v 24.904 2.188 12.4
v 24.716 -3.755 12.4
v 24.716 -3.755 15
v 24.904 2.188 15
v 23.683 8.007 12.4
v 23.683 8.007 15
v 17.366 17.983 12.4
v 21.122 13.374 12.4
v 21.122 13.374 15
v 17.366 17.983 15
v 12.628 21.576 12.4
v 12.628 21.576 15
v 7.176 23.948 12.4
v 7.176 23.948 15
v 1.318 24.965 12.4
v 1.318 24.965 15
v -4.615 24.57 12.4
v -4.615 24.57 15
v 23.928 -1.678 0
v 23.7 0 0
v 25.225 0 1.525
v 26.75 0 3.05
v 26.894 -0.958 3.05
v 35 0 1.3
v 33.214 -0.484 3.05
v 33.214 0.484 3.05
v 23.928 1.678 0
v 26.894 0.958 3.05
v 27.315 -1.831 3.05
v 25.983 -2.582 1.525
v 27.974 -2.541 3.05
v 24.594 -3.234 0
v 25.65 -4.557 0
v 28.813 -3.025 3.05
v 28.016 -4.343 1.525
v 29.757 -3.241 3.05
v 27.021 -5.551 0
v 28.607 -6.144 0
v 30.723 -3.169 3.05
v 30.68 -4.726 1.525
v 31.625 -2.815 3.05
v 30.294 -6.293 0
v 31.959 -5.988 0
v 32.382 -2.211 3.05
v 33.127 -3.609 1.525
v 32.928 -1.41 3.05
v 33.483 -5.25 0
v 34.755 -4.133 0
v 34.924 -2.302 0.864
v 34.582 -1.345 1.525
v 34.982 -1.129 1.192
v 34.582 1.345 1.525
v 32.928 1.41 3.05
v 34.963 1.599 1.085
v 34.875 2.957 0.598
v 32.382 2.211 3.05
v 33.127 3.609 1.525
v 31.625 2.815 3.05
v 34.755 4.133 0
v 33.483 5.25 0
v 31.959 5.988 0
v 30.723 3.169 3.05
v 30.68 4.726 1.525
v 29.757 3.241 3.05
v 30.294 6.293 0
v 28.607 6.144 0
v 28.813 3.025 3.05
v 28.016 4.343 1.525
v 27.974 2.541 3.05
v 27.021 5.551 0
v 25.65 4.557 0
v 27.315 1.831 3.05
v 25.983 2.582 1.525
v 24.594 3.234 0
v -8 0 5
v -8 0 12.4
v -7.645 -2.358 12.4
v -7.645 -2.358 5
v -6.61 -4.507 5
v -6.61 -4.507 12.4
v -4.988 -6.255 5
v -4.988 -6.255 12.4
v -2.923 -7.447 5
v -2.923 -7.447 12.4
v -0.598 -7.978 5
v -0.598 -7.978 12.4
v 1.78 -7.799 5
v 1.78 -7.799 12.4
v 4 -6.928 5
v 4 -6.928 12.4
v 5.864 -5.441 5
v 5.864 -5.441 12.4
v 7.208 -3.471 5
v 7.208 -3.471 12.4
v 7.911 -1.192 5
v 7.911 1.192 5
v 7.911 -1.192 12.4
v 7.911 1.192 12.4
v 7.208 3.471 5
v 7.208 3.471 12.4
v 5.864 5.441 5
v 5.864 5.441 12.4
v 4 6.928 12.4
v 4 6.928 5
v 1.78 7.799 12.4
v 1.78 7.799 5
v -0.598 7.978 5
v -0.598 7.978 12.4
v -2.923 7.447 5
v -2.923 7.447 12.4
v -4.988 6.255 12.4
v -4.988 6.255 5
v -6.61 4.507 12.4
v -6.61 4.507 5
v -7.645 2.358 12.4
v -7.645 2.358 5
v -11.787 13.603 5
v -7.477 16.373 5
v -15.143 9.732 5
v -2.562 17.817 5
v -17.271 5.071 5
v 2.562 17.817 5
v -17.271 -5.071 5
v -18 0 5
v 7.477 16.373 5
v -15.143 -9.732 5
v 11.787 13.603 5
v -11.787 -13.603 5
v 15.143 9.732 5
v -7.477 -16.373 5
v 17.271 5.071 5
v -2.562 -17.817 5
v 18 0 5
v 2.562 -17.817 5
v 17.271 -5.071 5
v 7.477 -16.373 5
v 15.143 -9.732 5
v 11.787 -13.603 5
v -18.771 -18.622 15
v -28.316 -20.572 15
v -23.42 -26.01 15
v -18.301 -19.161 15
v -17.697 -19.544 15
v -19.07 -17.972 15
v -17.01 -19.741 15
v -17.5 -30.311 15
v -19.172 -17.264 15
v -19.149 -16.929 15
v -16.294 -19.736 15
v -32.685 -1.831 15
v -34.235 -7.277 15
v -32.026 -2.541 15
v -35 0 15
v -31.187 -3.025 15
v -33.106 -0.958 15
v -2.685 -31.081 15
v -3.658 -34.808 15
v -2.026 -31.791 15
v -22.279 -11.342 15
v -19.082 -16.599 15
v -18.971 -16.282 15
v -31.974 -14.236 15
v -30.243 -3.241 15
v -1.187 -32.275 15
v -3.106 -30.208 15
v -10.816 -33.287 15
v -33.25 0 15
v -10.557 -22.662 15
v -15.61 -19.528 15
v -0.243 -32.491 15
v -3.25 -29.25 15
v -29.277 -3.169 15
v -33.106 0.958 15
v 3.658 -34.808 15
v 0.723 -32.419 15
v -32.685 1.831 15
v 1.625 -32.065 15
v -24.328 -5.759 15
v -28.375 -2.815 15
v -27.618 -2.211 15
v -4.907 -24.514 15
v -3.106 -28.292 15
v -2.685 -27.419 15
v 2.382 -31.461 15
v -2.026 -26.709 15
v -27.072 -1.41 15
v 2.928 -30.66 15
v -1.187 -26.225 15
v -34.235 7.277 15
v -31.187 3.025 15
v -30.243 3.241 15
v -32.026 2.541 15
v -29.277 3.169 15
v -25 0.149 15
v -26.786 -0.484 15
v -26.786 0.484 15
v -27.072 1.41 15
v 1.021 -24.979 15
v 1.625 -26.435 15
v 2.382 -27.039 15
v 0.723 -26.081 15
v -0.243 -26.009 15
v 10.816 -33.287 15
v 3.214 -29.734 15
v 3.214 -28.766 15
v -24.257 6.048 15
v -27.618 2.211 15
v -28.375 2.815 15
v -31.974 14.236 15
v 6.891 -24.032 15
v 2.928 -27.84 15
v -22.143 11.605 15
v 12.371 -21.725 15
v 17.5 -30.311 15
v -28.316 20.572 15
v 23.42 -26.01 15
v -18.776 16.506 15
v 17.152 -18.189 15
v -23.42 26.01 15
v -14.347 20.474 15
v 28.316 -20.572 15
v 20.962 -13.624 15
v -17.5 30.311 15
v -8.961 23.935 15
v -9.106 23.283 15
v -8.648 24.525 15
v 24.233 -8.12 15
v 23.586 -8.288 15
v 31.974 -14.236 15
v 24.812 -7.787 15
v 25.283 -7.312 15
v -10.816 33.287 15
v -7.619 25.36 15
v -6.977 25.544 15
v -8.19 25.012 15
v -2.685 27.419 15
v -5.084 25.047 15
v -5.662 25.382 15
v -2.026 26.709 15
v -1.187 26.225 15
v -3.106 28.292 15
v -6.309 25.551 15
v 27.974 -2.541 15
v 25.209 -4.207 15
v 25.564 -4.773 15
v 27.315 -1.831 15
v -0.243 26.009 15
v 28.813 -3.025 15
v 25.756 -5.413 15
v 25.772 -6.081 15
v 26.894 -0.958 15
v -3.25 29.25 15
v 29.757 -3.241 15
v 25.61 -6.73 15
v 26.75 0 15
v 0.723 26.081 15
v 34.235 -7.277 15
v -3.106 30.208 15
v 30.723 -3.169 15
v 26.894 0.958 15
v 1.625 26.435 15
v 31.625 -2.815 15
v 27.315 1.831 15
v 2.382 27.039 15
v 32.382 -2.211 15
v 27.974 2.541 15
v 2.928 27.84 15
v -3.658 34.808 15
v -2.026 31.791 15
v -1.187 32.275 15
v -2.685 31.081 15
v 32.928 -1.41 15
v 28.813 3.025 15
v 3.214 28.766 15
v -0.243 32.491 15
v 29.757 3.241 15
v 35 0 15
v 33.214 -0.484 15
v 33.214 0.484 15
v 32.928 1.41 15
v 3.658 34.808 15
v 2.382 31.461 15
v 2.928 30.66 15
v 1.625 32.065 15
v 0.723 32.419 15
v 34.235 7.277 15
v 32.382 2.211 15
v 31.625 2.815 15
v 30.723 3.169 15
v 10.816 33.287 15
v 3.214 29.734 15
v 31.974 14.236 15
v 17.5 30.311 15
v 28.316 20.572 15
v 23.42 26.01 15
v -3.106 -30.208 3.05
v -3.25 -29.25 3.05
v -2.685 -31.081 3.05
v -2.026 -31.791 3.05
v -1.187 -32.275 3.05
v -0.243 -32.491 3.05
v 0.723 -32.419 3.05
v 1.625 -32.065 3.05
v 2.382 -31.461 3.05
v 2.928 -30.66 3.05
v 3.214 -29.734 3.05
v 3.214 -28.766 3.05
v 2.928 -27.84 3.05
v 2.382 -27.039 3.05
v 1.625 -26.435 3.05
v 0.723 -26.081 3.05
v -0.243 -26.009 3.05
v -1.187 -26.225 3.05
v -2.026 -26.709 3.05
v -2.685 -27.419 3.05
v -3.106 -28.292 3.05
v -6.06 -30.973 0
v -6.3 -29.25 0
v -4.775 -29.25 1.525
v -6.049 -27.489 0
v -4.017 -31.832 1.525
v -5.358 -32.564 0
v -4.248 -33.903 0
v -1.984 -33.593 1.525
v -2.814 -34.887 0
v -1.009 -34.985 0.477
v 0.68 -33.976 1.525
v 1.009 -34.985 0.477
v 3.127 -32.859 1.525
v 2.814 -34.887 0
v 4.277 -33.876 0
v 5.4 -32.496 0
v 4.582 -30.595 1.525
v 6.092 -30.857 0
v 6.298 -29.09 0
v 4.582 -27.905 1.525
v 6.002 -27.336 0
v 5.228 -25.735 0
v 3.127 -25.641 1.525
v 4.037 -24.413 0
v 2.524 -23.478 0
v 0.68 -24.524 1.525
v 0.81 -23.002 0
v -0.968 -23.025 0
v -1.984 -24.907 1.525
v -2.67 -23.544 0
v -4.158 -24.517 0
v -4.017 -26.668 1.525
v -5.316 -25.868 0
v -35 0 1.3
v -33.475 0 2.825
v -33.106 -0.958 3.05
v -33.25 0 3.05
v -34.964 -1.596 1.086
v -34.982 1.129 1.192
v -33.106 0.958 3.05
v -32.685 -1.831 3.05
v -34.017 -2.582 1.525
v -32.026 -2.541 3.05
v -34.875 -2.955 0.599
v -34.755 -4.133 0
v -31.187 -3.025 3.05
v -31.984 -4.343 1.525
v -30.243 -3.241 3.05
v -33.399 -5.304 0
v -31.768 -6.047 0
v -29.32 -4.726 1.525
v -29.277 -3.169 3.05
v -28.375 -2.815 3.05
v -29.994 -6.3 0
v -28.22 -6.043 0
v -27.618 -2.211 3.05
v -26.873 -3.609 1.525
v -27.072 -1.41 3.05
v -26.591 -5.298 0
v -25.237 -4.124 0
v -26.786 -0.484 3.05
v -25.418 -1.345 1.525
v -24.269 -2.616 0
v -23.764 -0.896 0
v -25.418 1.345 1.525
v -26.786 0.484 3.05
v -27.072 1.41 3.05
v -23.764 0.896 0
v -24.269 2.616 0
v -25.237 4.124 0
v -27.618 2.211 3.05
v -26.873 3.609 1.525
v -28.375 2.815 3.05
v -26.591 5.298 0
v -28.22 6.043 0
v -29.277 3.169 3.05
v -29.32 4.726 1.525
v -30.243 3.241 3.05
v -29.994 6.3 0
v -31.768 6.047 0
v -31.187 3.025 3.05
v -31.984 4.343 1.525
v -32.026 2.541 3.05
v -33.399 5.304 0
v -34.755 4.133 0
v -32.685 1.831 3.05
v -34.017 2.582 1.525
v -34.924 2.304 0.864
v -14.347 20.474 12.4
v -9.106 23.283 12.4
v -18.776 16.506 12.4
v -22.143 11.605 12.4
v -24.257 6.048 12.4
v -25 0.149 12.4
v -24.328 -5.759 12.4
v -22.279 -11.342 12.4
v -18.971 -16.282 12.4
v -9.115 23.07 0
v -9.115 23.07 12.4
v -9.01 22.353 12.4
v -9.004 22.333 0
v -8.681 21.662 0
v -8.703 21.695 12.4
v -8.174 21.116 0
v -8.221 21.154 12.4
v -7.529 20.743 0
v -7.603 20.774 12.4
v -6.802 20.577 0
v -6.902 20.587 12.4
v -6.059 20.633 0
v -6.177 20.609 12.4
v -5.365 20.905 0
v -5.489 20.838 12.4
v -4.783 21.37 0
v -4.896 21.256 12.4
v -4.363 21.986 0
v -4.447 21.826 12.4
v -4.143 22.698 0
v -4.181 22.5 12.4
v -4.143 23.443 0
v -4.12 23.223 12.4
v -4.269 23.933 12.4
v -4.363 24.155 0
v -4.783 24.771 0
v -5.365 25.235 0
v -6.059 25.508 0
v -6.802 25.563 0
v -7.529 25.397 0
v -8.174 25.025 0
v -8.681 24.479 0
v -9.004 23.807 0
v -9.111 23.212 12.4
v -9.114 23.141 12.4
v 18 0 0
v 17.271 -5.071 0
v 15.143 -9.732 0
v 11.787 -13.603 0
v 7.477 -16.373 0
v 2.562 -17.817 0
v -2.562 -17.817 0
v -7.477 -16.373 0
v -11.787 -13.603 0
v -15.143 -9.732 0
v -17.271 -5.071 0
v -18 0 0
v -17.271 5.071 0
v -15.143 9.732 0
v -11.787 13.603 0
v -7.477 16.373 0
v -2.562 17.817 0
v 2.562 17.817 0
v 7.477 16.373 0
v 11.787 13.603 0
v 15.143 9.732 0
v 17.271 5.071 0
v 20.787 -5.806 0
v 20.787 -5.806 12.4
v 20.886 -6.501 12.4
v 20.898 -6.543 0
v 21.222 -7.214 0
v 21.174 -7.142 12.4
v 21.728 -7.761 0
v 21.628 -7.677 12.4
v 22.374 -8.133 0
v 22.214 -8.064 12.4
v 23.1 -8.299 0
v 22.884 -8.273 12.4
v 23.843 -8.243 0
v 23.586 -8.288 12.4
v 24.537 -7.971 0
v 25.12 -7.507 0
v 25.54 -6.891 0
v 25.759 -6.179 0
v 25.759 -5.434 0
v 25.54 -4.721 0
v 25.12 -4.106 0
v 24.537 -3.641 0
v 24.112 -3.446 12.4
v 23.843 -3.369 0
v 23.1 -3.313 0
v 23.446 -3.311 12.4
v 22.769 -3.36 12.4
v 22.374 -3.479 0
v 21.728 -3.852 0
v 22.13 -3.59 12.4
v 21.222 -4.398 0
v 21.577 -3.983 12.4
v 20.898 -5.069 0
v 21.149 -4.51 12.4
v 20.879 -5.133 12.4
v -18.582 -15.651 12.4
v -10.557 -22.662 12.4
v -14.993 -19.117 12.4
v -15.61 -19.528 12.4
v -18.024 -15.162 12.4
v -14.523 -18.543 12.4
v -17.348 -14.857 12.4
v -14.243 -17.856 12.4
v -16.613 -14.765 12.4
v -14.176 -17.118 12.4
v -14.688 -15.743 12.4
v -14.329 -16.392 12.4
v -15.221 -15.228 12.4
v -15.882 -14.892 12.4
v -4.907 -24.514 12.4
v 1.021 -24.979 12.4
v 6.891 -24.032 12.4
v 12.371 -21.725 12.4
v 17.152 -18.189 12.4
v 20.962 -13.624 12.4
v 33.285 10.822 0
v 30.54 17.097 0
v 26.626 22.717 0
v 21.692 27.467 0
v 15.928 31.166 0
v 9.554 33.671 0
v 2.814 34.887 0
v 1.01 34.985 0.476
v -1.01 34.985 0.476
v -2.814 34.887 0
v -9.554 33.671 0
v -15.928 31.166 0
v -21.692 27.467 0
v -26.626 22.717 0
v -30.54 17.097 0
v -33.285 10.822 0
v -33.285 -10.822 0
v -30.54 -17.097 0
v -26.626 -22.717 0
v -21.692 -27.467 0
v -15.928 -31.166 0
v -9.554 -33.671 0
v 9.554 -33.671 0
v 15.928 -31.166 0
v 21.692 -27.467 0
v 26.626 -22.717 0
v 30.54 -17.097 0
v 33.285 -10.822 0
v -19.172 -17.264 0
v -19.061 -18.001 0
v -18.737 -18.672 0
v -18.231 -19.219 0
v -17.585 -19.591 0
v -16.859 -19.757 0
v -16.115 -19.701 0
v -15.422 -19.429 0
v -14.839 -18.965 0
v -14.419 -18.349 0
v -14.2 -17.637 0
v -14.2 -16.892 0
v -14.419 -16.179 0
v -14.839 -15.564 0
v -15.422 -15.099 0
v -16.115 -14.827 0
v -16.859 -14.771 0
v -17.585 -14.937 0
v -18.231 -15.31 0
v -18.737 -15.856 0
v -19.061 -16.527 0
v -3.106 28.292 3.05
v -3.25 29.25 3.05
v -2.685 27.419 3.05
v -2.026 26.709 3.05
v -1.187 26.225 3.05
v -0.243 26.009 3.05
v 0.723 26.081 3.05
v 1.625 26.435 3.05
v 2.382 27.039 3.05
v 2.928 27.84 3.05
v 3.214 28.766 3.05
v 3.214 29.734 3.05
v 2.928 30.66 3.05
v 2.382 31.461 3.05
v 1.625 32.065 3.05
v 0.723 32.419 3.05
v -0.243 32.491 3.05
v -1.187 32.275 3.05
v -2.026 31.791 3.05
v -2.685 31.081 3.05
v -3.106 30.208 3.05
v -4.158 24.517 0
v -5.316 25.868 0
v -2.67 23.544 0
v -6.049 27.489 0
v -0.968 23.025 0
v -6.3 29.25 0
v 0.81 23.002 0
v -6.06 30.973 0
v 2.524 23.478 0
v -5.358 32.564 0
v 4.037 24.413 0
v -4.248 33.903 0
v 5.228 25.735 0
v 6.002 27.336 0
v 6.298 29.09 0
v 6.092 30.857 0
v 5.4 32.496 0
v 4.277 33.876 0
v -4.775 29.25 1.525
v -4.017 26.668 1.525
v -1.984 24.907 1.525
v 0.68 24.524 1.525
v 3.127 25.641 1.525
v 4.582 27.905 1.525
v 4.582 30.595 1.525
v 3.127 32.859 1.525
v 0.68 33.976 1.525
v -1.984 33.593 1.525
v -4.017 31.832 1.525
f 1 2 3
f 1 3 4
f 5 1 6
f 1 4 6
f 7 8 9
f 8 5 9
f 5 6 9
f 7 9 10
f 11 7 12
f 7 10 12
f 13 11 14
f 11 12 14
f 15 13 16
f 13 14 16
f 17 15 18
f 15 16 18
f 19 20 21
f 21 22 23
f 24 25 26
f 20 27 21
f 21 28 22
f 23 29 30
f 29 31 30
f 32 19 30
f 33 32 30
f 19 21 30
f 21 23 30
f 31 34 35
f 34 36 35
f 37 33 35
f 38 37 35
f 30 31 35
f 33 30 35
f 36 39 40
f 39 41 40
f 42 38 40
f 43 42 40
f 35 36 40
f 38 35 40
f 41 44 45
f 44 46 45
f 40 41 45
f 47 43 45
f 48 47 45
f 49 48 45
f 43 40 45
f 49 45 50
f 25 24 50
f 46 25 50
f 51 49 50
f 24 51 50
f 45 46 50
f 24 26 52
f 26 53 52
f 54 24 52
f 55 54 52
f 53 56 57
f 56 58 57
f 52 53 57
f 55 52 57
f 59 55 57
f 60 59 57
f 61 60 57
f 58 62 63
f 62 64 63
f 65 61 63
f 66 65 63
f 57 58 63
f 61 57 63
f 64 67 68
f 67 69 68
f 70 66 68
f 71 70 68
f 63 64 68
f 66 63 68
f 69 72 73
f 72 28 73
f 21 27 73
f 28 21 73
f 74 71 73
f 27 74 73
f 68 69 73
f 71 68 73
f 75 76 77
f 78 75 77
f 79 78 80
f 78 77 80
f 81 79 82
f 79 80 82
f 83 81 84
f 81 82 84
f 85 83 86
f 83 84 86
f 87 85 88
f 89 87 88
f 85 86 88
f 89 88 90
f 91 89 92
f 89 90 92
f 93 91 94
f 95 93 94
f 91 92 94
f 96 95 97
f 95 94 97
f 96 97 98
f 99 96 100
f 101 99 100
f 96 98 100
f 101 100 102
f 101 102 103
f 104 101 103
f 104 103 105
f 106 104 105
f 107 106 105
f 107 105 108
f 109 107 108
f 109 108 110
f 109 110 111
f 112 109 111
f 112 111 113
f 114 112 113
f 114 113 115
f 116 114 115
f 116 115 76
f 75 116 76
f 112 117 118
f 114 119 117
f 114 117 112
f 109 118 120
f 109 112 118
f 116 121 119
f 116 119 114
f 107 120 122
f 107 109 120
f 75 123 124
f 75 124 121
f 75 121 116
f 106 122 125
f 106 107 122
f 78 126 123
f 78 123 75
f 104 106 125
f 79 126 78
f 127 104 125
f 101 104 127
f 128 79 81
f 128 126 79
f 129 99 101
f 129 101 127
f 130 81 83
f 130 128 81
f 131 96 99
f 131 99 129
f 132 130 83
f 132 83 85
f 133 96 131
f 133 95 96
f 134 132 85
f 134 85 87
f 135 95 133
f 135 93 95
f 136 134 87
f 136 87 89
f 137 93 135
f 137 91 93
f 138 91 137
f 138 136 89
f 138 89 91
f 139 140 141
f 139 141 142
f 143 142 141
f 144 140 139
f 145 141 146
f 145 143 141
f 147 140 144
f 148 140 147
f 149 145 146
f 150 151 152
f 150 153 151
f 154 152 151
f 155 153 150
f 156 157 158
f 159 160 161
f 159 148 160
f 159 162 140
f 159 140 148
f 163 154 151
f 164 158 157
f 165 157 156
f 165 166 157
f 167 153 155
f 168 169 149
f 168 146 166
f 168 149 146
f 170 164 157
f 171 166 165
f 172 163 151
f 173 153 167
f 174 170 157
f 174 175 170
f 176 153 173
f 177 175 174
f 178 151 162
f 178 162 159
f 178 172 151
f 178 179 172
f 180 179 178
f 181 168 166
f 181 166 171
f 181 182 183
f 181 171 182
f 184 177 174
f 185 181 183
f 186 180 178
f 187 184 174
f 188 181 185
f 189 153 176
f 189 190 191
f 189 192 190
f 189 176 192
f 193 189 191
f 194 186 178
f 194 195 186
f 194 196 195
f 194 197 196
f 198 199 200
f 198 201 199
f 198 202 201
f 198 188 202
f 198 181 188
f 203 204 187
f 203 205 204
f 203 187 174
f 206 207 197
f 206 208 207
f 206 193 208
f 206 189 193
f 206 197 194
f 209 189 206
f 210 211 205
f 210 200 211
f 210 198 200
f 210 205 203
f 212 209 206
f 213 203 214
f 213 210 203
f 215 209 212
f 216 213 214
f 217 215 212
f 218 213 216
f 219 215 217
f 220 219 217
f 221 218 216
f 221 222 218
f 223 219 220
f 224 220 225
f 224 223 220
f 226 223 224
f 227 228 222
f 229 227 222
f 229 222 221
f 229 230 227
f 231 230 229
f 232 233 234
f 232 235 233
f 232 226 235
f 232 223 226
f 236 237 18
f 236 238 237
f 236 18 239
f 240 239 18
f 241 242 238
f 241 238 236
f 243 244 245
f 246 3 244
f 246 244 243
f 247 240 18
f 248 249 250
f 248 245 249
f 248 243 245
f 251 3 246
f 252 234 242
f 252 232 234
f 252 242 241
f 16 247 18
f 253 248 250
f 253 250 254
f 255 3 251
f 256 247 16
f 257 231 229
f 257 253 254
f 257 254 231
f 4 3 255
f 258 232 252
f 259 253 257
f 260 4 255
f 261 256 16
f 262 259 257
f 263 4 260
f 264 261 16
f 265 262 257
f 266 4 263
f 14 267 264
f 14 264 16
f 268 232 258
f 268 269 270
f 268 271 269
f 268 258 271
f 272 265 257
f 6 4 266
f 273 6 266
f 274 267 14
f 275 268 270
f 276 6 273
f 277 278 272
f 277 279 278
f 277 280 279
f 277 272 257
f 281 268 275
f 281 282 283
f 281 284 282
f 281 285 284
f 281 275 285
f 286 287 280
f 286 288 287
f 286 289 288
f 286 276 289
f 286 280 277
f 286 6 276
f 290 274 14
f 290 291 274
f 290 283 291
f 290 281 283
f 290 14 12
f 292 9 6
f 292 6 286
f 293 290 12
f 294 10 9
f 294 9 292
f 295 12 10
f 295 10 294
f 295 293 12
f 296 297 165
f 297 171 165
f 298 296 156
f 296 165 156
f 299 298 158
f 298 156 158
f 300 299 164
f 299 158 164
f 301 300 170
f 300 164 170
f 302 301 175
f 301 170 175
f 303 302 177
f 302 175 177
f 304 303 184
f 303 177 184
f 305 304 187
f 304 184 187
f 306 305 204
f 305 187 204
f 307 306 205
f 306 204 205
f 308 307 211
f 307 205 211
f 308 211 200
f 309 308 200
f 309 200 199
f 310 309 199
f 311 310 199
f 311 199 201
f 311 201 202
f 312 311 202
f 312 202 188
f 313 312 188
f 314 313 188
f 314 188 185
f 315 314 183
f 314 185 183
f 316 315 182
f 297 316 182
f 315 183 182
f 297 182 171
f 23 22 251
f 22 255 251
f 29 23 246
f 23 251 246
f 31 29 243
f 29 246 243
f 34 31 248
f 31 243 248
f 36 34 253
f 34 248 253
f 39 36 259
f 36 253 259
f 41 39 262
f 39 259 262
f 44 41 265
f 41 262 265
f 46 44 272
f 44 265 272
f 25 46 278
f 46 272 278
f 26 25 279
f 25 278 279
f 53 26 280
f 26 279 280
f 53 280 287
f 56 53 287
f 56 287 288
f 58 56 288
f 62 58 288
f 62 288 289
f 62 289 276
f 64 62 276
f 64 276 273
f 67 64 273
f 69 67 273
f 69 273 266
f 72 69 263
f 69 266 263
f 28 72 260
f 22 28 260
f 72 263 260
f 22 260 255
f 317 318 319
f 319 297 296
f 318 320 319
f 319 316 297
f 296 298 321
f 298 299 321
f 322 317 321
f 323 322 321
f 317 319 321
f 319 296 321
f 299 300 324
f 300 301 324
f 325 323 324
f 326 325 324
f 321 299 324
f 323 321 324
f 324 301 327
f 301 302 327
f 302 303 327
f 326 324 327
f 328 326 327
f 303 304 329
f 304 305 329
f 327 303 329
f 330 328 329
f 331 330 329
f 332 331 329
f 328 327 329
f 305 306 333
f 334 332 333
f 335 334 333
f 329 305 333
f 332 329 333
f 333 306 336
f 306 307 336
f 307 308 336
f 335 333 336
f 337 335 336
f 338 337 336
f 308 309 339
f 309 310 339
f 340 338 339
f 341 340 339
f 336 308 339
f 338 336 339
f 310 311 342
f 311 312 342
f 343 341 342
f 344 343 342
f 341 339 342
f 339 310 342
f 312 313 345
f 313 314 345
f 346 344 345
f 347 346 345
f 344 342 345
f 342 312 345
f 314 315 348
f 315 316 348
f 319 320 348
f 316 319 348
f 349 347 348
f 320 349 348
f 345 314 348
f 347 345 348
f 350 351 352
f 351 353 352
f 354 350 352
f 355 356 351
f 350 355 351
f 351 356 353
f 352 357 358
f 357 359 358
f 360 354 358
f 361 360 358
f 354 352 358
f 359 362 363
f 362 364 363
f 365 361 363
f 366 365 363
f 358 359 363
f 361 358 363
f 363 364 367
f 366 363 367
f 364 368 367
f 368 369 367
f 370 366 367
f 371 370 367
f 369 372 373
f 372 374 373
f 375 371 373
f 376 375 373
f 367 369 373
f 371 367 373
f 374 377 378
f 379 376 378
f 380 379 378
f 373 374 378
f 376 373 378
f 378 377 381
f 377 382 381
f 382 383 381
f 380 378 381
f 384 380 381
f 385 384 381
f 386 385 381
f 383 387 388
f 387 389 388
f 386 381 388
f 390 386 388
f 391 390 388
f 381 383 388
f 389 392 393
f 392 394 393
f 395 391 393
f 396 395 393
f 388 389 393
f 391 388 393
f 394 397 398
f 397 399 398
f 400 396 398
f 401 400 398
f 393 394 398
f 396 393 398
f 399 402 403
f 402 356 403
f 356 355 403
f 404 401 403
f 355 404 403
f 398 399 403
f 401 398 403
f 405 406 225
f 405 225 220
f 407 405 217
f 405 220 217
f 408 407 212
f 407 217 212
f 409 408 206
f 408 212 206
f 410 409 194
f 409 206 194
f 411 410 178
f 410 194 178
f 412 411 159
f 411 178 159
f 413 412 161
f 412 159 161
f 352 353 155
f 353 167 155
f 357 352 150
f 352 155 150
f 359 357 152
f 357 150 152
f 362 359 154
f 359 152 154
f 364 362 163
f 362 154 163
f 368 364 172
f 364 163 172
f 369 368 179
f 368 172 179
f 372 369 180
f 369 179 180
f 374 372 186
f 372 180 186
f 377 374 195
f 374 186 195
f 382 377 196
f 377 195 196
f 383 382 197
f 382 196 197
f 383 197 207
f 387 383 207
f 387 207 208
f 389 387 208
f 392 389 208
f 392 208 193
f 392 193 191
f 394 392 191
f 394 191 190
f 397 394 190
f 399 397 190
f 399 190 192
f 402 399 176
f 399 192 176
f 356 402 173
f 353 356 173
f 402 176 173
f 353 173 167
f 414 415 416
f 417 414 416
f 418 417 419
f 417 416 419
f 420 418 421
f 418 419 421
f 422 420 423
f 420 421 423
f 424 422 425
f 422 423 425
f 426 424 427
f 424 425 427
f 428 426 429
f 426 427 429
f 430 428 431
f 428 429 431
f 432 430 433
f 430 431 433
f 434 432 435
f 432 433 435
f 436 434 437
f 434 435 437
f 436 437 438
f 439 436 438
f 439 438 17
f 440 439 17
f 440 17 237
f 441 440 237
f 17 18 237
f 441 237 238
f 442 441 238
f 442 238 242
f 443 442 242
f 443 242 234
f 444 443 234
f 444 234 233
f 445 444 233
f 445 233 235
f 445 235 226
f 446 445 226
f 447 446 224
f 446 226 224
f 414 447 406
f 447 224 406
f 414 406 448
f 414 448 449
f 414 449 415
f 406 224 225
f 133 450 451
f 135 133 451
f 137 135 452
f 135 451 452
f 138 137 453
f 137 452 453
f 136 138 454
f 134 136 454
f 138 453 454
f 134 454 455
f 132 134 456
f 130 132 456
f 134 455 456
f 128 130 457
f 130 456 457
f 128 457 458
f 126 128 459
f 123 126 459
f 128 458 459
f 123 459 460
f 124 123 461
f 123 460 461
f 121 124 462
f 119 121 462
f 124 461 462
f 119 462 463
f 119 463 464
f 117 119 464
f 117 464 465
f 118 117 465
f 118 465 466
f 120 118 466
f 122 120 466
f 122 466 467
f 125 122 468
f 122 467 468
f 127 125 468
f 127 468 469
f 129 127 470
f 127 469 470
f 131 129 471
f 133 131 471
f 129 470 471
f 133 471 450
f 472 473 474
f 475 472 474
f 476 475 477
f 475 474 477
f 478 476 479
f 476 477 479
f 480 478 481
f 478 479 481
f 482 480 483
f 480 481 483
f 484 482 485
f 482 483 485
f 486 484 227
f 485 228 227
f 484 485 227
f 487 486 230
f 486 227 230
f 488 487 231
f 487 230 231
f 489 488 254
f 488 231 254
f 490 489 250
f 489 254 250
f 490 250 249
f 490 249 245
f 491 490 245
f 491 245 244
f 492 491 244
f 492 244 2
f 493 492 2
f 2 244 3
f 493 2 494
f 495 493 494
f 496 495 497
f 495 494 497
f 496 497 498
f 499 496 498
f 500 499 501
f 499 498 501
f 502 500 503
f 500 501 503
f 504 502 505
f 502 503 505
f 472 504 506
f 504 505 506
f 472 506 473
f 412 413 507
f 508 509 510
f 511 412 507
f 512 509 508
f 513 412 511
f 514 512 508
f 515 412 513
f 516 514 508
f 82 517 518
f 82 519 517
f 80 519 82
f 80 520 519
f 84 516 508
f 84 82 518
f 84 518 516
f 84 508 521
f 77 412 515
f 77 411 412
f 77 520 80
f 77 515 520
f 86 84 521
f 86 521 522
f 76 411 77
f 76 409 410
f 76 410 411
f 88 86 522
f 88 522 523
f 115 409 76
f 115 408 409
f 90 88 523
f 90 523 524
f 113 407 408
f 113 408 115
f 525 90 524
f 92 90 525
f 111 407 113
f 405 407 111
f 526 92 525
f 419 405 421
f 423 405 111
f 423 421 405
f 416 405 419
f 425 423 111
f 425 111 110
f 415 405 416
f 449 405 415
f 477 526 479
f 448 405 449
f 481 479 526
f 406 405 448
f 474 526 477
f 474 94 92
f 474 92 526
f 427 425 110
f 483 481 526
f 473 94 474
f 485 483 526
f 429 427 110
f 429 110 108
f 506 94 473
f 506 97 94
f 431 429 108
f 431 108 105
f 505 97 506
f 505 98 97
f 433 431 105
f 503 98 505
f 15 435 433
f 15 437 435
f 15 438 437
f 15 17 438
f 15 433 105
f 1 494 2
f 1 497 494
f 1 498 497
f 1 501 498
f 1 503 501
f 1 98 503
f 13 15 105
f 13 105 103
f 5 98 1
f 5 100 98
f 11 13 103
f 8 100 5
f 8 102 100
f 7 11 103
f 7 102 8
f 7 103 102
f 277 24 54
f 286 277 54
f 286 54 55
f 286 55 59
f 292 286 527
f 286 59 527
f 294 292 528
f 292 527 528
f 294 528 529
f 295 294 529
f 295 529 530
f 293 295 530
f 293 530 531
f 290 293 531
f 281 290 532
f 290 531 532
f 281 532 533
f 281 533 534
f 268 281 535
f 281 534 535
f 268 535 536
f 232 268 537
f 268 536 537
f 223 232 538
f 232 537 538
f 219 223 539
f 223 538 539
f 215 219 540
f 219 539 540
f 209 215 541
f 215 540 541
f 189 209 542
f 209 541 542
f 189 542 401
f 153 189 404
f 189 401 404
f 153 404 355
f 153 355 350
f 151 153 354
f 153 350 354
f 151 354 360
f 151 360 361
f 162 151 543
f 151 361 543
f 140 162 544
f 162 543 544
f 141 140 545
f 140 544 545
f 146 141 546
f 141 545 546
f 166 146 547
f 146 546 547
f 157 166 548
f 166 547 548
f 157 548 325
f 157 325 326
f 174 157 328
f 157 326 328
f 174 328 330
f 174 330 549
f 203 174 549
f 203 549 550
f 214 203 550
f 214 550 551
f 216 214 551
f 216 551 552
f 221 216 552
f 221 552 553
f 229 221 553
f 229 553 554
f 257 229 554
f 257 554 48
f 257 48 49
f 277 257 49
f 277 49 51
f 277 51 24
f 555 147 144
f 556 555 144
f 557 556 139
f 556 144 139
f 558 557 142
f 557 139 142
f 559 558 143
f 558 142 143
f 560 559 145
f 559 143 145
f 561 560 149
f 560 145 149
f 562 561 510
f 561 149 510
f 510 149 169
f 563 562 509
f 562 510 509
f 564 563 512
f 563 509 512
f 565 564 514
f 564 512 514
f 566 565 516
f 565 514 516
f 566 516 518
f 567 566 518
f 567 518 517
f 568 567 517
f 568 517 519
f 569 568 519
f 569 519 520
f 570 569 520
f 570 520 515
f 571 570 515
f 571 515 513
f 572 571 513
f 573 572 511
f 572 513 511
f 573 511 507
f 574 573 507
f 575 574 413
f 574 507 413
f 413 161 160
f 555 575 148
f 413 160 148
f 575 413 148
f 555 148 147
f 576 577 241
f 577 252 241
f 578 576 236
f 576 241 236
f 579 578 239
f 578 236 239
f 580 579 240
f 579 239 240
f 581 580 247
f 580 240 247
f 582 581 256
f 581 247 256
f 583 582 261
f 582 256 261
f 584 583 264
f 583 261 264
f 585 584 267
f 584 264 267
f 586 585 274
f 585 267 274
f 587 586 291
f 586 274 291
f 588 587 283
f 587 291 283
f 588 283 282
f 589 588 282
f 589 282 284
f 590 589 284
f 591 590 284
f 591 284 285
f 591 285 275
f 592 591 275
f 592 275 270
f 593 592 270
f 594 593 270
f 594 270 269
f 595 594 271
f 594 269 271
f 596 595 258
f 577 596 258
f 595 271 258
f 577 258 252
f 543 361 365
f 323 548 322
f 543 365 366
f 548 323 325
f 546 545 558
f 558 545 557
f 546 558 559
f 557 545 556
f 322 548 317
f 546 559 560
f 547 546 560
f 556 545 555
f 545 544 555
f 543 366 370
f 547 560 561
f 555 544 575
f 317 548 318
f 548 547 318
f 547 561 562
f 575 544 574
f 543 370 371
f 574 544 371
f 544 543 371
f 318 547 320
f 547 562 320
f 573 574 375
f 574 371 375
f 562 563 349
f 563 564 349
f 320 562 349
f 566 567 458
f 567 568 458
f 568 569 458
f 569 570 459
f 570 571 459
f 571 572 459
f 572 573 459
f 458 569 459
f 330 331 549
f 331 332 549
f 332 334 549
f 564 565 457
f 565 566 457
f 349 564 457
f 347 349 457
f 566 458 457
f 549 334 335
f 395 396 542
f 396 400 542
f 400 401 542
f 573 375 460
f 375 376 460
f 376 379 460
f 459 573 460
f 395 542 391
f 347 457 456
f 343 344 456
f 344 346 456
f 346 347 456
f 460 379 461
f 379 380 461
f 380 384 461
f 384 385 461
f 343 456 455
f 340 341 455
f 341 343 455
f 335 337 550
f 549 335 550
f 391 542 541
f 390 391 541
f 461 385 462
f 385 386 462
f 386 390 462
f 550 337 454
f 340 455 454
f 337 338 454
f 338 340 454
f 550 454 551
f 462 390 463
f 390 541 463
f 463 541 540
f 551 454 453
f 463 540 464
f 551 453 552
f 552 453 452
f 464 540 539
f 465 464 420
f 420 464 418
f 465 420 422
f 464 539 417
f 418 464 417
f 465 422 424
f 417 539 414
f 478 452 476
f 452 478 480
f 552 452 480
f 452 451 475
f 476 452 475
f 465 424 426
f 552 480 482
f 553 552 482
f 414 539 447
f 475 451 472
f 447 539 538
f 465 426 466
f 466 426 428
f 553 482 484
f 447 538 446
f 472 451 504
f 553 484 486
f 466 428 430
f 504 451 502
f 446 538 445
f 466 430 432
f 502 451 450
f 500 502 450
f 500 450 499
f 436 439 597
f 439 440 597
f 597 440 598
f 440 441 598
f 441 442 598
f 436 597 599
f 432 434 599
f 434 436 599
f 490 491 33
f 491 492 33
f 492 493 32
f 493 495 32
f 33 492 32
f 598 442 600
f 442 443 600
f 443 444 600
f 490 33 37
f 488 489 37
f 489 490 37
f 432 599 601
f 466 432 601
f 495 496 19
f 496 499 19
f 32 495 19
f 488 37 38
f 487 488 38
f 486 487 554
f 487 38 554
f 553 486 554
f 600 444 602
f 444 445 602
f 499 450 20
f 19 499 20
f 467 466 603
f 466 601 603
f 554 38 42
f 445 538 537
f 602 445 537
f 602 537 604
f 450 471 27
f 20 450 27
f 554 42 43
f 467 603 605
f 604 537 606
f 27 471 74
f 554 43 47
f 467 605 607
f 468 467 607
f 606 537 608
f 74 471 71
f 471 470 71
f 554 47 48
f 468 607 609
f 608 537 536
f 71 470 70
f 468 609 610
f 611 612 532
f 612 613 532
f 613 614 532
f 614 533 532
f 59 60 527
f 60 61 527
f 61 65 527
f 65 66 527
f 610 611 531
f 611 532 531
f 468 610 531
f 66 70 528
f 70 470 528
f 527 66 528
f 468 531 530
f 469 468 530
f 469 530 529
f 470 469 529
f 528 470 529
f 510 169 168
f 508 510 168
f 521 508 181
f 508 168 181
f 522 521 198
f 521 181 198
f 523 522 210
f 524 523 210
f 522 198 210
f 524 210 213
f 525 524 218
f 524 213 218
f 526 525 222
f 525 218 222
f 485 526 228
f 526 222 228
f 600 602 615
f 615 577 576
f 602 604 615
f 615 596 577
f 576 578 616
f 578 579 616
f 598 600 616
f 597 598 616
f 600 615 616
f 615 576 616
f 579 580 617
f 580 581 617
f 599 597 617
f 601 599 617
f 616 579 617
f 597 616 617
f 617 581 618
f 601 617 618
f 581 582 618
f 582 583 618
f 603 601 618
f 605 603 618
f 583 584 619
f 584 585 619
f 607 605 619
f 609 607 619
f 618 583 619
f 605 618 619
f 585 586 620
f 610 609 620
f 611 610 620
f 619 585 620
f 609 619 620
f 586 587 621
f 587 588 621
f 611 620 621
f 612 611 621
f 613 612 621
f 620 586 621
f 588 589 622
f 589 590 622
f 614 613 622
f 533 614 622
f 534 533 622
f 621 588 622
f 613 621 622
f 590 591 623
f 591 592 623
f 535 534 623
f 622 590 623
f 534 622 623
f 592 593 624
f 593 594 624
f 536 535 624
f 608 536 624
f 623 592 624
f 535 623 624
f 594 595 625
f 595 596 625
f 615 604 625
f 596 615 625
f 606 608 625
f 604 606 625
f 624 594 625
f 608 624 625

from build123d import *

# Parameters (mm, degrees)
F0_R           = 35
F1_DEPTH       = 15
F2_R           = 25
F3_DEPTH       = 2.6
F4_R           = 18
F5_DEPTH       = 5
F6_D           = 5
F7_D           = 6.5
F7_CSINK_D     = 12.6
F7_CSINK_ANGLE = 90
F8_D           = 16


with BuildPart() as f1:
    # F0 (on Top) → F1 (new body)
    with BuildSketch(Plane.XY):
        Circle(F0_R)
    extrude(amount=F1_DEPTH)

    # F2 (on face) → F3 (cut)
    with BuildSketch(Plane.XY.offset(15)):
        Circle(F2_R)
    extrude(amount=-F3_DEPTH, mode=Mode.SUBTRACT)

    # F4 (on face) → F5 (cut)
    with BuildSketch(Plane(origin=(0, 0, 0), x_dir=(1, 0, 0), z_dir=(0, 0, -1))):
        Circle(F4_R)
    extrude(amount=-F5_DEPTH, mode=Mode.SUBTRACT)

    # F6 (through all)
    with Locations(Plane(origin=(0, 0, 0), x_dir=(1, 0, 0), z_dir=(0, 0, -1))):
        with Locations((-6.6152965396, -23.0702807025), (-16.671800891, 17.2641552081), (23.2870974306, 5.8061254944)):
            Hole(F6_D / 2)

    # F7 (through all)
    with Locations(Plane(origin=(0, 0, 0), x_dir=(1, 0, 0), z_dir=(0, 0, -1))):
        with Locations((30, 0), (-30, 0), (0, -29.25), (0, 29.25)):
            CounterSinkHole(F7_D / 2, F7_CSINK_D / 2, counter_sink_angle=F7_CSINK_ANGLE)

    # F8 (through all)
    with Locations(Plane(origin=(0, 0, 0), x_dir=(1, 0, 0), z_dir=(0, 0, -1))):
        with Locations((0, 0)):
            Hole(F8_D / 2)


solid = f1.part
